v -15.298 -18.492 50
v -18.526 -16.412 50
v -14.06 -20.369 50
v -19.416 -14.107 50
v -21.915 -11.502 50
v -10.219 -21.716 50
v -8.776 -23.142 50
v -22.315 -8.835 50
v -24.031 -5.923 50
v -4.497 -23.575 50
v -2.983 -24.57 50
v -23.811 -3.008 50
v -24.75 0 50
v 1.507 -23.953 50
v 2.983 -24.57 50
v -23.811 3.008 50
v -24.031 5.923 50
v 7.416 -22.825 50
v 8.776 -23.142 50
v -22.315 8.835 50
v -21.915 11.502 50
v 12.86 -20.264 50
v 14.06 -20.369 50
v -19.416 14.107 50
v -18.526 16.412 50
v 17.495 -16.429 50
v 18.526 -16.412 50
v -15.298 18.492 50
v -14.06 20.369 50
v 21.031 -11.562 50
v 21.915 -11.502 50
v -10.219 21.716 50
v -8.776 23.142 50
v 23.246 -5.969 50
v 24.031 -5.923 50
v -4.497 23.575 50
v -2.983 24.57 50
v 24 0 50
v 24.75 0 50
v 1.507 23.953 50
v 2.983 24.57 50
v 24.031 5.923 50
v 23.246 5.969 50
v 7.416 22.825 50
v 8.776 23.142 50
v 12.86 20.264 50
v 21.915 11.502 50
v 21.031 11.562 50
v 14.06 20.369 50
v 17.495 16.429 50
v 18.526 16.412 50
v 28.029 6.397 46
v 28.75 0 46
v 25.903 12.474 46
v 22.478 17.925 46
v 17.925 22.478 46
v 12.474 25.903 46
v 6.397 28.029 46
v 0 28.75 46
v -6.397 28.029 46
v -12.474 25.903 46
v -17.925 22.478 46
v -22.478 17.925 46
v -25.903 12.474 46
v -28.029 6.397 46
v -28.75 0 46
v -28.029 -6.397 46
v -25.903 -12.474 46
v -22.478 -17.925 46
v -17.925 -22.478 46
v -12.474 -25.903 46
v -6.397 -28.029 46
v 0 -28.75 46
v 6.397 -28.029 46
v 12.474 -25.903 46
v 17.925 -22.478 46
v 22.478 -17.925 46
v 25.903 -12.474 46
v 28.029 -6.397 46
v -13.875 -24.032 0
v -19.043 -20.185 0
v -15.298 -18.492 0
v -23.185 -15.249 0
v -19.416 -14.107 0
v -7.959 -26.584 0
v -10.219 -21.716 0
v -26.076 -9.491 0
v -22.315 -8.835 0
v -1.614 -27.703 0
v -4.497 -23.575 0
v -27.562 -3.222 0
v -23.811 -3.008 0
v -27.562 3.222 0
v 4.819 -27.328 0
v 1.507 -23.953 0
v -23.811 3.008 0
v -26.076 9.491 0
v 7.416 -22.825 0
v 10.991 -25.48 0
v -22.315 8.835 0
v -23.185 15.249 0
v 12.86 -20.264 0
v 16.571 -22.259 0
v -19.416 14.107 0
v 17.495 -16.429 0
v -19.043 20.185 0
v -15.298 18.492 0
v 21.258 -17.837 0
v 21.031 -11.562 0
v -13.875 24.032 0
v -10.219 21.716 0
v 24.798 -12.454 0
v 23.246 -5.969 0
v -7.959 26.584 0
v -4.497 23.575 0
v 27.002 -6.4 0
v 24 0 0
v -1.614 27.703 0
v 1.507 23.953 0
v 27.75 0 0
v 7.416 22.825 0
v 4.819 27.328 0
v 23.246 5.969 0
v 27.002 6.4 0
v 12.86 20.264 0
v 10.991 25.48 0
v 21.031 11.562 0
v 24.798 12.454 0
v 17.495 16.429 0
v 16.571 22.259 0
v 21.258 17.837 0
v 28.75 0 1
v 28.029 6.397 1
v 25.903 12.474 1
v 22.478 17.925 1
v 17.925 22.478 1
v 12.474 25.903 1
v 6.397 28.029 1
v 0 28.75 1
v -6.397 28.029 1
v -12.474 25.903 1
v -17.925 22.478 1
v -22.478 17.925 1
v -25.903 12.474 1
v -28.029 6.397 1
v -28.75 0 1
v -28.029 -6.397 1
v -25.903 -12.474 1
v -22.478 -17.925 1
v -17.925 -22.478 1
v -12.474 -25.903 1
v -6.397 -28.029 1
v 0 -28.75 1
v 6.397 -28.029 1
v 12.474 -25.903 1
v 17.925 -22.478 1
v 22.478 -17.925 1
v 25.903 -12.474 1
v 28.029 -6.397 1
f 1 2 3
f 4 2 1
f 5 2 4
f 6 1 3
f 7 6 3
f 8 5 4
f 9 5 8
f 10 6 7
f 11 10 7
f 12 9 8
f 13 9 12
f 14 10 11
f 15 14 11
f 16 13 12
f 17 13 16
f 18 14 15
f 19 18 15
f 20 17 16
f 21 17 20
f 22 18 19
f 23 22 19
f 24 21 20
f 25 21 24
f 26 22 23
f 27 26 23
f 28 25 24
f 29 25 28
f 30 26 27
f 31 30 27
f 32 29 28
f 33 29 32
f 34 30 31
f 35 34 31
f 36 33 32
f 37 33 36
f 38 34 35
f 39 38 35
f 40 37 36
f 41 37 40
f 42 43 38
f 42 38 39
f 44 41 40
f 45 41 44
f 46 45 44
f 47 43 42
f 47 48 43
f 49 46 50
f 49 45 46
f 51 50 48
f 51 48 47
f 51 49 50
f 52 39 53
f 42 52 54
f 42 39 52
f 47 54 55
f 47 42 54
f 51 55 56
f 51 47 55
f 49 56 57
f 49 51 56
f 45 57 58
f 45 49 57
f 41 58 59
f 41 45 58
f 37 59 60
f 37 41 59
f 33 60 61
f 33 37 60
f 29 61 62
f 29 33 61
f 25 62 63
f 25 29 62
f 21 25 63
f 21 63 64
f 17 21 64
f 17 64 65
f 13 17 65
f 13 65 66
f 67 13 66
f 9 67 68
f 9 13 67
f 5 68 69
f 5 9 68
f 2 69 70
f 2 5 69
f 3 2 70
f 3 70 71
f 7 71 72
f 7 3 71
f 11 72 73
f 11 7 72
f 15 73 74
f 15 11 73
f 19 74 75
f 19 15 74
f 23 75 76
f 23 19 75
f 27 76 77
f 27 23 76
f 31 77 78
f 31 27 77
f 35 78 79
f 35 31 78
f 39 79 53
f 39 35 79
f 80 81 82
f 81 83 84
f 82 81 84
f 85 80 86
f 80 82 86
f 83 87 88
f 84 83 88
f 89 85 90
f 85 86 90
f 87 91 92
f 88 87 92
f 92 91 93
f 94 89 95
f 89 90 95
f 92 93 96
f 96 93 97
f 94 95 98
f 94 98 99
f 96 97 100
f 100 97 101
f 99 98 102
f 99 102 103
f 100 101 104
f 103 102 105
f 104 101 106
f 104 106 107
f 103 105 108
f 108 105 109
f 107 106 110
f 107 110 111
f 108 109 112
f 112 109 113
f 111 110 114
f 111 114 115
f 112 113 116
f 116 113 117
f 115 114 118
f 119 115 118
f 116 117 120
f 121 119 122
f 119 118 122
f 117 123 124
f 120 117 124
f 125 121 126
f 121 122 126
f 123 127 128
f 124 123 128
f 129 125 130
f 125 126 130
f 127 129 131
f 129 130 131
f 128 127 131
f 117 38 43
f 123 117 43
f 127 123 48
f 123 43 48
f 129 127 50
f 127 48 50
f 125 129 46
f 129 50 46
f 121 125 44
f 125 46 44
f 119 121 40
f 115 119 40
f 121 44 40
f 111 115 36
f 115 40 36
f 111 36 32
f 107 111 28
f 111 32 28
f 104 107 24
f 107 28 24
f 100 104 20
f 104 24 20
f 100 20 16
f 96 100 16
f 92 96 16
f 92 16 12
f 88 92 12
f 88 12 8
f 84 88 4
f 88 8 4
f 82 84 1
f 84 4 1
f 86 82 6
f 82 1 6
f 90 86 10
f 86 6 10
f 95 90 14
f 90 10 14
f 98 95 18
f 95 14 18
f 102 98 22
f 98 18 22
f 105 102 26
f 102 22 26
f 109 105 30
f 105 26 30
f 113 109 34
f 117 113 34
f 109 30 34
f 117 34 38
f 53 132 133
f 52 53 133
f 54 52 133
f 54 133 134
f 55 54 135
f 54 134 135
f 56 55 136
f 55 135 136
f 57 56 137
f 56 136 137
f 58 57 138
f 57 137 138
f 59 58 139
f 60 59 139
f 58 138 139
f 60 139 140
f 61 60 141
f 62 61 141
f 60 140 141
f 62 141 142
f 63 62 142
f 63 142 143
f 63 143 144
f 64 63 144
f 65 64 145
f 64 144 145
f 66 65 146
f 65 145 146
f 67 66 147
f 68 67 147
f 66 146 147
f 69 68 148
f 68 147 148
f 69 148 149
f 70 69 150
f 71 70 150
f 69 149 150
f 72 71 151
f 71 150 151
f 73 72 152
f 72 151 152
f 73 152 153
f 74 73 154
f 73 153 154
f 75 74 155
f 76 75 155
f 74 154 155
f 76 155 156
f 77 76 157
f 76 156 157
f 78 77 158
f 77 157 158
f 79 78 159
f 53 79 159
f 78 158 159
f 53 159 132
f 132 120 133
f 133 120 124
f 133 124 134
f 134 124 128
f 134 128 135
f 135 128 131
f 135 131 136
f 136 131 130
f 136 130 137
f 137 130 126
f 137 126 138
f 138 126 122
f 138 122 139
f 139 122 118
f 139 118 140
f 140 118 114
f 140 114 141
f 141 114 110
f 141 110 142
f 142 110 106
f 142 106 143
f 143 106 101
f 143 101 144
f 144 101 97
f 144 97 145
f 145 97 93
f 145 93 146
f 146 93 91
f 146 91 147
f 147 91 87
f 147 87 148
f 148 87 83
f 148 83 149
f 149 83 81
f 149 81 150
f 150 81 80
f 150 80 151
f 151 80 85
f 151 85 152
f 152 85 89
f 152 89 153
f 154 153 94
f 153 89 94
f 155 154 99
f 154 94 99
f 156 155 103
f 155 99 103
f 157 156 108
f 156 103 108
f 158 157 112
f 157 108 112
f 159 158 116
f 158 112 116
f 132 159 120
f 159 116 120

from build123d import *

# Parameters (mm, degrees)
SKETCH_R        = 28.75
PAD_DEPTH       = 50
SKETCH001_R     = 24
POCKET_DEPTH    = 50
CHAMFER_SIZE    = 4
CHAMFER001_SIZE = 1


with BuildPart() as part:
    # Sketch → Pad (new body)
    with BuildSketch(Plane.XY):
        Circle(SKETCH_R)
    extrude(amount=PAD_DEPTH)

    # Sketch001 (on Face3 of Pad) → Pocket (cut)
    with BuildSketch(Plane.XY.offset(50)):
        Circle(SKETCH001_R)
    extrude(amount=-POCKET_DEPTH, mode=Mode.SUBTRACT)

    # Chamfer
    chamfer_edges = [part.edges().sort_by_distance(p)[0] for p in [
        (-28.75, 0, 50),
    ]]
    chamfer(chamfer_edges, length=CHAMFER_SIZE)

    # Chamfer001
    chamfer001_edges = [part.edges().sort_by_distance(p)[0] for p in [
        (-28.75, 0, 0),
    ]]
    chamfer(chamfer001_edges, length=CHAMFER001_SIZE)


solid = part.part
